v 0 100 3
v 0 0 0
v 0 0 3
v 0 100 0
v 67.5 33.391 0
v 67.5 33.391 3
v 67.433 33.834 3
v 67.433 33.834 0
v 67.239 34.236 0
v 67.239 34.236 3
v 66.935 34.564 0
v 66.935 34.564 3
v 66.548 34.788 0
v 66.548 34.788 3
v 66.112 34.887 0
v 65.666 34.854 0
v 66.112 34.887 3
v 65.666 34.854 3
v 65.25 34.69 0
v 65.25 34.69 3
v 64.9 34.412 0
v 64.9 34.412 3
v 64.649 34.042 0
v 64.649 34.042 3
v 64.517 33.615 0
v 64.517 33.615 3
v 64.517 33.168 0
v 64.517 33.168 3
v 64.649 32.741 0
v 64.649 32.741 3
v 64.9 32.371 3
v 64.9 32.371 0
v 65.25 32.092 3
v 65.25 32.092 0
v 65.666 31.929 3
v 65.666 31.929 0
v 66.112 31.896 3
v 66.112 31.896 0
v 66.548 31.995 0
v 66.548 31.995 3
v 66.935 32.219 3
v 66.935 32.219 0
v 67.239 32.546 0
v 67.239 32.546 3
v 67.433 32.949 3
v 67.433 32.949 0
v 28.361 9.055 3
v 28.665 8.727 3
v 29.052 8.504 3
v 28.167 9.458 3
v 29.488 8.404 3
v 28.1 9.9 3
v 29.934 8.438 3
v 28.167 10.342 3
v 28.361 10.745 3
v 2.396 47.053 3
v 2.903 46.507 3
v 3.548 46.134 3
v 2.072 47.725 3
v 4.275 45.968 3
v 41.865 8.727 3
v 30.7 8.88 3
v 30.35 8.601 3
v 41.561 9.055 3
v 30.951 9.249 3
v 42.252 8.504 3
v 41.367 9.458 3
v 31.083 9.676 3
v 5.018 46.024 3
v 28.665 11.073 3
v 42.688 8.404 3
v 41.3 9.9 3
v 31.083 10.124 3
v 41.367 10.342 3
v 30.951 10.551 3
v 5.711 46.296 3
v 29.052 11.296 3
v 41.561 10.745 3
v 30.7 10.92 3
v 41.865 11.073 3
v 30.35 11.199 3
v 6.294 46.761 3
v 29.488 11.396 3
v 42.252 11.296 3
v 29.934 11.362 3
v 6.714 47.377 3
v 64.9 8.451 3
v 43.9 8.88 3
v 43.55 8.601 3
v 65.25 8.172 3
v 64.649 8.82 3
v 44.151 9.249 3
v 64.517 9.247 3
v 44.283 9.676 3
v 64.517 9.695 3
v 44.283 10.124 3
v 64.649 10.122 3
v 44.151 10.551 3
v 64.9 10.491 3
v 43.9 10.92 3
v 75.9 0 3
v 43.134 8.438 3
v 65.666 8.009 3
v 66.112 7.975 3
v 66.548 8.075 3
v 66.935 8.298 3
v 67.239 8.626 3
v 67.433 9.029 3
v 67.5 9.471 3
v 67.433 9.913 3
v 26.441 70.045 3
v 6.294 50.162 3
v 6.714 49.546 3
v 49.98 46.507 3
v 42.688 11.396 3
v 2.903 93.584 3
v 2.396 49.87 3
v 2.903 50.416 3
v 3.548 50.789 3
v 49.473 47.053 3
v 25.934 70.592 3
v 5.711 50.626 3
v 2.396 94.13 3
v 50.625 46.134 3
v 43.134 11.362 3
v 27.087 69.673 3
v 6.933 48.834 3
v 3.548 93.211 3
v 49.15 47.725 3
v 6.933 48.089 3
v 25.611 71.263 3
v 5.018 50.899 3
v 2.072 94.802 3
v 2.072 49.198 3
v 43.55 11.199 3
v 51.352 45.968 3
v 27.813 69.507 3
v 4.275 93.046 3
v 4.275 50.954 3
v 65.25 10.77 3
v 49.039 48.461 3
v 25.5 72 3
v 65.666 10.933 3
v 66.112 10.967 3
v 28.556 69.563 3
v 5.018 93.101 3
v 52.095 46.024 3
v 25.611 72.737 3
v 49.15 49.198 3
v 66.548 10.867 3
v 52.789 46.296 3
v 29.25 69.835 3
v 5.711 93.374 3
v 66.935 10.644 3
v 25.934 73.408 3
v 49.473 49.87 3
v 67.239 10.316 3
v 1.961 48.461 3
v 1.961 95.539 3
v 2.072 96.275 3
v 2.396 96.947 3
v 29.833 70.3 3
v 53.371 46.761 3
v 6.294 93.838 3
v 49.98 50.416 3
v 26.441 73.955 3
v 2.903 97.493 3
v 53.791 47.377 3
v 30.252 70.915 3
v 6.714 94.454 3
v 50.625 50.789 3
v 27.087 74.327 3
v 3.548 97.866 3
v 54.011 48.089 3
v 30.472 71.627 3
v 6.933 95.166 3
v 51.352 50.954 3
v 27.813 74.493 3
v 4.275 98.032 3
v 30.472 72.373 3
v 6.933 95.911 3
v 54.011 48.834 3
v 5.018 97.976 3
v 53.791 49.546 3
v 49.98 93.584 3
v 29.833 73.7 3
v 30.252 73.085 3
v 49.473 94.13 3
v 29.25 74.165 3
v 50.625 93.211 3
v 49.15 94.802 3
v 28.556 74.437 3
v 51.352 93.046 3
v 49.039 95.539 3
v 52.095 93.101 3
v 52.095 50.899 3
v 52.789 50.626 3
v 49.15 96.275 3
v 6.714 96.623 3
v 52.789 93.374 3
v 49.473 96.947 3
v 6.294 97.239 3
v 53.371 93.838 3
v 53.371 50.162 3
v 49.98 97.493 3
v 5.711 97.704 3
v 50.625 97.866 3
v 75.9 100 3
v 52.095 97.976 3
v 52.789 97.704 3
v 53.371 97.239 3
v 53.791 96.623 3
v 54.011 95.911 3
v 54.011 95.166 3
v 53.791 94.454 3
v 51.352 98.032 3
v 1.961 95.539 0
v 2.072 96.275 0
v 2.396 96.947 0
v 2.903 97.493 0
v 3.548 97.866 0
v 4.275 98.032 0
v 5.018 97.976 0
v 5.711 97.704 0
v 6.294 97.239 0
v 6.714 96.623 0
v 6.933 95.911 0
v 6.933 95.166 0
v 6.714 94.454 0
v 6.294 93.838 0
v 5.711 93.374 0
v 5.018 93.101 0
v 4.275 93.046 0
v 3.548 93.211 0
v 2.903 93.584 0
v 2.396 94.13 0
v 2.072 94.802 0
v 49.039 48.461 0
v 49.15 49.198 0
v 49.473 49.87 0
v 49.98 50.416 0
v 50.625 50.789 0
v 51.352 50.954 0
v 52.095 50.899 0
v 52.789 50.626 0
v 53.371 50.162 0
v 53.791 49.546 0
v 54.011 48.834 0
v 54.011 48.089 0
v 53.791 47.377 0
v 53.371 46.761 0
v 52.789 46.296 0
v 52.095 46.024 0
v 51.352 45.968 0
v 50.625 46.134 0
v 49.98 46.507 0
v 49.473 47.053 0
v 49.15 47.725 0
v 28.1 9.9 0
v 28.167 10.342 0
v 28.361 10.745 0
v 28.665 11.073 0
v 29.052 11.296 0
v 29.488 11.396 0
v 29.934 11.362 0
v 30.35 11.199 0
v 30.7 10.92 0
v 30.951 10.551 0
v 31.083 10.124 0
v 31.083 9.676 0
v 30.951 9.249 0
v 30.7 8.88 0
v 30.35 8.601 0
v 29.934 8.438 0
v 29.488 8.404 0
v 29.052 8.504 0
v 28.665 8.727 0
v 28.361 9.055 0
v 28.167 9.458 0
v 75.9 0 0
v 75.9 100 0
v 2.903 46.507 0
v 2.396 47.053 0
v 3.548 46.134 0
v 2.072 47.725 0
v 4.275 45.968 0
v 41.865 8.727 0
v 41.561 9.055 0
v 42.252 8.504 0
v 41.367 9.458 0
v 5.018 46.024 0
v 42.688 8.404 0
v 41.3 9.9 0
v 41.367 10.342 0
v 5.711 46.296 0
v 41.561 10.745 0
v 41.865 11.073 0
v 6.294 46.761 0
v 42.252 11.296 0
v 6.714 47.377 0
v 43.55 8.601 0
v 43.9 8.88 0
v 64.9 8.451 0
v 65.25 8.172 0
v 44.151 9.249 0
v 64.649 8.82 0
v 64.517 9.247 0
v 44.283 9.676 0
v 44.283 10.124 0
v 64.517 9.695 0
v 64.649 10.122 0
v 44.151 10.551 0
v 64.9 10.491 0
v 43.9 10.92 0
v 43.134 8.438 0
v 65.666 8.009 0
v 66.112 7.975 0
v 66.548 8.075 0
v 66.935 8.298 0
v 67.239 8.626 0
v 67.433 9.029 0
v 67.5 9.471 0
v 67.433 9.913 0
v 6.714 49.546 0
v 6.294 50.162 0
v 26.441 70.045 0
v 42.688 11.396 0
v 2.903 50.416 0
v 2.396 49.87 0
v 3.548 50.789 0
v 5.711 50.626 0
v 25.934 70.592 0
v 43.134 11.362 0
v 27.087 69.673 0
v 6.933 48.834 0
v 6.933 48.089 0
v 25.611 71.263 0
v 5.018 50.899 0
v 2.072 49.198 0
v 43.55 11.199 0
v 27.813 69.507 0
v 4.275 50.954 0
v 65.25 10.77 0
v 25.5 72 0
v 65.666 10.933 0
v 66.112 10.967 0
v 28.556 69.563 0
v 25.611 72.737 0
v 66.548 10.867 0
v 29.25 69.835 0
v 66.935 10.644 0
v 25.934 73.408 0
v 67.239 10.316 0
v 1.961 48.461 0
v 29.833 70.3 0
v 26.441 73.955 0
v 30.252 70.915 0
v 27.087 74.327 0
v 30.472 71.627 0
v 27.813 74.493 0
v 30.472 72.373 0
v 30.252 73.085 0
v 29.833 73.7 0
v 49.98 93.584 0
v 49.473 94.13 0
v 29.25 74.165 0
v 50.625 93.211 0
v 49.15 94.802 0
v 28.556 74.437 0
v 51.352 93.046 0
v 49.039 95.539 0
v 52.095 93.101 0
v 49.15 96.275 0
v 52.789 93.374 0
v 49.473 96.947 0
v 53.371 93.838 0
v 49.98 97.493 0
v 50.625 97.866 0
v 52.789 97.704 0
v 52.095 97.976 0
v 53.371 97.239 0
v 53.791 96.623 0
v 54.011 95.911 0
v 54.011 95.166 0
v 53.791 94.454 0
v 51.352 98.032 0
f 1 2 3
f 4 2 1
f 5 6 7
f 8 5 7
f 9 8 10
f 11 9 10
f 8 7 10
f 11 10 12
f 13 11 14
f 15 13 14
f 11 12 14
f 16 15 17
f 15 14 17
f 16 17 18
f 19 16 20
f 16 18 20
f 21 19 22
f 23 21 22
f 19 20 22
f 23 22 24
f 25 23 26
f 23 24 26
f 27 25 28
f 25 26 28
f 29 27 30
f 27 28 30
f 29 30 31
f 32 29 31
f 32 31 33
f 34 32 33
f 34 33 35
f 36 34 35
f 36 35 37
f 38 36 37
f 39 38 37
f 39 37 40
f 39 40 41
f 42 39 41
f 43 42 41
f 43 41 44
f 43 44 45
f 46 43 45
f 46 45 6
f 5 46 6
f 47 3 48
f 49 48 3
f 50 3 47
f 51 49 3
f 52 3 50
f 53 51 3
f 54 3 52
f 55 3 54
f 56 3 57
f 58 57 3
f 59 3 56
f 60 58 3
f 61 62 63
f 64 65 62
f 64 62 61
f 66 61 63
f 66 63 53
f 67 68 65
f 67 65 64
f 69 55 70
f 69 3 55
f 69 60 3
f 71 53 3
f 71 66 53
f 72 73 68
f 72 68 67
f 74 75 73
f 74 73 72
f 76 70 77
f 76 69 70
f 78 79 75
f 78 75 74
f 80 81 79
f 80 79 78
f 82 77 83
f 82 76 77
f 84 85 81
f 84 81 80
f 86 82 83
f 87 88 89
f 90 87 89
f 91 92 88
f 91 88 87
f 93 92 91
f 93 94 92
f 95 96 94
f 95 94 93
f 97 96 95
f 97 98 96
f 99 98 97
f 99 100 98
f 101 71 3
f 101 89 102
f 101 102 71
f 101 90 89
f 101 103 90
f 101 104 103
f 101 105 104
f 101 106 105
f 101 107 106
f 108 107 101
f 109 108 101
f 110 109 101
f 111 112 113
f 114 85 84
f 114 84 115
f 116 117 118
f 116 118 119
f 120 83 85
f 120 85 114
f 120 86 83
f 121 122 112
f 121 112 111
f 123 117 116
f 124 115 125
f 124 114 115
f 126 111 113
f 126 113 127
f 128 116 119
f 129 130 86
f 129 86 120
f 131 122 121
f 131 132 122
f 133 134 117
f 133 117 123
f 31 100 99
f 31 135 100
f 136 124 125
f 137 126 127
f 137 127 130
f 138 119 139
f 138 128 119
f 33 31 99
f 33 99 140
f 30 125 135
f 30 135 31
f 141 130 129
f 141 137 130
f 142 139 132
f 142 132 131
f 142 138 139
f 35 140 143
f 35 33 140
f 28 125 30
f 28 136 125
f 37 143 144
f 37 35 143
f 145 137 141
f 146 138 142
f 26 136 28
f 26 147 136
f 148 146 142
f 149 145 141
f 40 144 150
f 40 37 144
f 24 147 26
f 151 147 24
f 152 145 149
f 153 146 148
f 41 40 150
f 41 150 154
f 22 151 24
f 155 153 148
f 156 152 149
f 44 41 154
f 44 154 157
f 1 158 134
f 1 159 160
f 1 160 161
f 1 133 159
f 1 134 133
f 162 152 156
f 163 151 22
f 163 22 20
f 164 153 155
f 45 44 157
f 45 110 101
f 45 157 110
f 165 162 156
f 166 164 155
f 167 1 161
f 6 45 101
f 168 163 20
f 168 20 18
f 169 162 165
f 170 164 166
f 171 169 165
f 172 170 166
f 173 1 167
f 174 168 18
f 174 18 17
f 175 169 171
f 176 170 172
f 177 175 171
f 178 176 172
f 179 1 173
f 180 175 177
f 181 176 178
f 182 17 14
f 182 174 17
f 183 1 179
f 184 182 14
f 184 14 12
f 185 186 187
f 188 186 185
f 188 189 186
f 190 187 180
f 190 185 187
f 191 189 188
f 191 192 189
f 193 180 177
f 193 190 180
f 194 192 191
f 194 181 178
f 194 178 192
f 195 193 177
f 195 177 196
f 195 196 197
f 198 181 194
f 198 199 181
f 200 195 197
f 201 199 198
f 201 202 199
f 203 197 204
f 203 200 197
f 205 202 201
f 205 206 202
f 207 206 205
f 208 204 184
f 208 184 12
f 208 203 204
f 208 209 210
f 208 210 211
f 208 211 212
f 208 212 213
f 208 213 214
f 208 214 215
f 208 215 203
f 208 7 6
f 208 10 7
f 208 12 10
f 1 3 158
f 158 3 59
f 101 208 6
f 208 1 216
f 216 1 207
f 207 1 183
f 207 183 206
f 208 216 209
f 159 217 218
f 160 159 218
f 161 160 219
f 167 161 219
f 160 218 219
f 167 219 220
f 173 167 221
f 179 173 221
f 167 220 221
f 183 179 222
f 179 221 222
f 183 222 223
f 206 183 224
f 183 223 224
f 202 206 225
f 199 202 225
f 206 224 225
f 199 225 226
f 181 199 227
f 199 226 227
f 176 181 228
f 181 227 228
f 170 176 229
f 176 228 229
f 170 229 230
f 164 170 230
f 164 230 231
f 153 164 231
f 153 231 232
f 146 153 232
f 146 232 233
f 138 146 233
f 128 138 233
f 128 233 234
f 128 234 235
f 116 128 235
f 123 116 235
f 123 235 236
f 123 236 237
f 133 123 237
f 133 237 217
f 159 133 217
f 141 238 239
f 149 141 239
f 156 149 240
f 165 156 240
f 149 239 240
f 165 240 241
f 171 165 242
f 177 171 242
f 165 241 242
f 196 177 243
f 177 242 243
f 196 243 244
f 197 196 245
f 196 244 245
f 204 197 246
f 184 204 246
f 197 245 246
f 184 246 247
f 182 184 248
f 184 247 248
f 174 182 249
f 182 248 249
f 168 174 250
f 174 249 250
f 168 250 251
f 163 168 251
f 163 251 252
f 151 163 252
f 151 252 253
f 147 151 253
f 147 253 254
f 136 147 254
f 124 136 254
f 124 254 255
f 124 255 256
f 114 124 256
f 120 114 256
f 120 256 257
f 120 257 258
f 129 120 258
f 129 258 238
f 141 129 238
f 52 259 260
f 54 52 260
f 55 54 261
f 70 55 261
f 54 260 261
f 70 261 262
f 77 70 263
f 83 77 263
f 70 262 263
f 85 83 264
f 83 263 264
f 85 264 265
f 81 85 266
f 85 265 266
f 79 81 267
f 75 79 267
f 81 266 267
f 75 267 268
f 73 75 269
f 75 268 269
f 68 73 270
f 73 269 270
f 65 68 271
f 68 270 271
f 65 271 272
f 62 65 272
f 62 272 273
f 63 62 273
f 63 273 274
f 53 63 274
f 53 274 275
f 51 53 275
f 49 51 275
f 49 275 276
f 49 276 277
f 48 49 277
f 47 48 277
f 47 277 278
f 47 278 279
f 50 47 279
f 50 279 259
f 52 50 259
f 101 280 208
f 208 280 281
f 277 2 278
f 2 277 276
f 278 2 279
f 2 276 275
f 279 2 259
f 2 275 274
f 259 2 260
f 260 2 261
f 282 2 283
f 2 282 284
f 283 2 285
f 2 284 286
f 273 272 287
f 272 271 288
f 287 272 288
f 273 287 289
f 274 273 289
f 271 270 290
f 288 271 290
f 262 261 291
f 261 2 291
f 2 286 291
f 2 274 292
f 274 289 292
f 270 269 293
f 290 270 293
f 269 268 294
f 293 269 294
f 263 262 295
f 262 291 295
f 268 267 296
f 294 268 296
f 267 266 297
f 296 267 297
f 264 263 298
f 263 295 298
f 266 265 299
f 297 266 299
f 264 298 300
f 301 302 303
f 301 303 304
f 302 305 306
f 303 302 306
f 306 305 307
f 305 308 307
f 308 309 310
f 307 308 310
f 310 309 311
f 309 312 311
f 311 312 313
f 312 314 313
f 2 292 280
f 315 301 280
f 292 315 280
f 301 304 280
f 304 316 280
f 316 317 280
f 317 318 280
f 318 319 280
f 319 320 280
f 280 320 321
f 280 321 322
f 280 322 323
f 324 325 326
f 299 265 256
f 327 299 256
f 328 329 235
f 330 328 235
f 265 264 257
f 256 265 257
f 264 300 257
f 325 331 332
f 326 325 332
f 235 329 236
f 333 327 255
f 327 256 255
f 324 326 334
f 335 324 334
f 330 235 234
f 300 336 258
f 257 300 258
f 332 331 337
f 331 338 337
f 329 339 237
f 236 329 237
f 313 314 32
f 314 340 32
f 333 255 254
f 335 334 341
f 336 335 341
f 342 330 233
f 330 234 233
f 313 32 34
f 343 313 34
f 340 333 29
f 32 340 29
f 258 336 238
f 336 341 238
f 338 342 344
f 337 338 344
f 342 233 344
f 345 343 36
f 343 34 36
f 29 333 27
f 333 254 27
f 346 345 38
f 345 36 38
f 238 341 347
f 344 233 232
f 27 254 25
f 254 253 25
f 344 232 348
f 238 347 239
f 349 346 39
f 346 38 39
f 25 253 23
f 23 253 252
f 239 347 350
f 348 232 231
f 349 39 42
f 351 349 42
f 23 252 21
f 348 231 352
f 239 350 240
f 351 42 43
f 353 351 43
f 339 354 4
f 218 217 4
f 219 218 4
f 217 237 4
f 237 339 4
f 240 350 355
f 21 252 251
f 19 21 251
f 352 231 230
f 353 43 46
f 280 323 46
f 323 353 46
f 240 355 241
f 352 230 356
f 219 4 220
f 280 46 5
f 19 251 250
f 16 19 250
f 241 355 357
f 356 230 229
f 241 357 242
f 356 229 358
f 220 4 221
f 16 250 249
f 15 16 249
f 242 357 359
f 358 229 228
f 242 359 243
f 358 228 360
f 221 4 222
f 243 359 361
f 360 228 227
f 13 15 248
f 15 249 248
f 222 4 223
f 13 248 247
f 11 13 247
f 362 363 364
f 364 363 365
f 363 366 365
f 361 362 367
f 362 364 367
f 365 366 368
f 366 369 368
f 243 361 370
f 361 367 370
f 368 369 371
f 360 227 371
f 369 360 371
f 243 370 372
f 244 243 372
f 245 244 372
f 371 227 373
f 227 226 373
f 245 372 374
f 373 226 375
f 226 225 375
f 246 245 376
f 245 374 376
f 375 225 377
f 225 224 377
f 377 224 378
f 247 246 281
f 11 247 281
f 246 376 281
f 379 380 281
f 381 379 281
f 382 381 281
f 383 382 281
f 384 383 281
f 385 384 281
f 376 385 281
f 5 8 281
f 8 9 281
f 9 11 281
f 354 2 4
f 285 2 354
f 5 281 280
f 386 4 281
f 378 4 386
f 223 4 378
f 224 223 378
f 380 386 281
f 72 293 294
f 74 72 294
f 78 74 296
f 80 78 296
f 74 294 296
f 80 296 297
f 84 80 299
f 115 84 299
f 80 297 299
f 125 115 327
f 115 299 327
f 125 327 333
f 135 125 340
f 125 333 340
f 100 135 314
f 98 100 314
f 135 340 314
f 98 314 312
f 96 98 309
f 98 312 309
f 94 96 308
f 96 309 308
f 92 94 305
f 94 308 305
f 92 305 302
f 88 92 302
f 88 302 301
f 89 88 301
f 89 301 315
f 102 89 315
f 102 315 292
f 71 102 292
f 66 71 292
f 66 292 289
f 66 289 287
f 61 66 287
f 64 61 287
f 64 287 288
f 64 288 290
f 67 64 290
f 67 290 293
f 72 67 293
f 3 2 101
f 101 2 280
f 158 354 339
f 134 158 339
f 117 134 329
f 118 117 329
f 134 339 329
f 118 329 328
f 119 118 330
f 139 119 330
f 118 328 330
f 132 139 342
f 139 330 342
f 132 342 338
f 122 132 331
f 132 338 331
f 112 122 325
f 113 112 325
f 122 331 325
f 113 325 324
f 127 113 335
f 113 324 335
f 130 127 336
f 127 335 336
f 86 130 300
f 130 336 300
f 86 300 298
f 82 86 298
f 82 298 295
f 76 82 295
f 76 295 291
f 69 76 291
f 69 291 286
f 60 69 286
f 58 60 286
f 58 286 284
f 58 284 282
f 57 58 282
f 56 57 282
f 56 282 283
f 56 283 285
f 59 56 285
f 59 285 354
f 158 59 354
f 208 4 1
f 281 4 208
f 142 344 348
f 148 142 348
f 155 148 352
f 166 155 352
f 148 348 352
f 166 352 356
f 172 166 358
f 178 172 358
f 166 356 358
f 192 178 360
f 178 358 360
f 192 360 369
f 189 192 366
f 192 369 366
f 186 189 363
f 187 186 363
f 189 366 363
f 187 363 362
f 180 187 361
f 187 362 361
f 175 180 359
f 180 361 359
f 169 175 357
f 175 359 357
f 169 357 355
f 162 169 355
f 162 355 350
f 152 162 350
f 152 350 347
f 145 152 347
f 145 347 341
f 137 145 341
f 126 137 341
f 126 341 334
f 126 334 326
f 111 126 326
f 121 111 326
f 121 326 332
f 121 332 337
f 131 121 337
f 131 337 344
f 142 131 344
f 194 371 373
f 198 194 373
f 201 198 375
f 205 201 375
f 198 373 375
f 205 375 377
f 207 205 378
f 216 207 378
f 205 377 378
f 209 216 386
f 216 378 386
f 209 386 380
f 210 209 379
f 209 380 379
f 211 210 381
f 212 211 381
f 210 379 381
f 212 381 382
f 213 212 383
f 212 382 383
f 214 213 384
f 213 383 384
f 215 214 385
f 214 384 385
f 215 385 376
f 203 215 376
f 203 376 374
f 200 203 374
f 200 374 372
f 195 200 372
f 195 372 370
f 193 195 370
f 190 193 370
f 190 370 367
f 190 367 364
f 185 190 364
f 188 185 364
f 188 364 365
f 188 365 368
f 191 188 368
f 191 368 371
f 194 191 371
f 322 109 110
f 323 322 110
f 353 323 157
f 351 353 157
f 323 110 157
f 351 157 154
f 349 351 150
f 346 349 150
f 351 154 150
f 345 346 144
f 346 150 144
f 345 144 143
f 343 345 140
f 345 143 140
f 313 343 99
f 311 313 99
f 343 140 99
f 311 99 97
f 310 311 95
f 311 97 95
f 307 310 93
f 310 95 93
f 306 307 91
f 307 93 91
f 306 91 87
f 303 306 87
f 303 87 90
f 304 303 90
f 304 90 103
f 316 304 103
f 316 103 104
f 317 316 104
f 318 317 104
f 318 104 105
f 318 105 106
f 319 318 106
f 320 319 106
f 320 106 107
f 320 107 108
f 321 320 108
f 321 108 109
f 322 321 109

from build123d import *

# Parameters (mm, degrees)
SKETCH1_W           = 75.9
SKETCH1_H           = 100
BOSS_EXTRUDE1_DEPTH = 3
SKETCH2_R           = 2.5
CUT_EXTRUDE1_DEPTH  = 10
SKETCH5_R           = 1.5
CUT_EXTRUDE2_DEPTH  = 10
SKETCH7_R           = 1.5
CUT_EXTRUDE3_DEPTH  = 19.8
SKETCH8_R           = 2.5
CUT_EXTRUDE4_DEPTH  = 10


with BuildPart() as part:
    # Sketch1 → Boss-Extrude1 (new body)
    with BuildSketch(Plane.XY):
        with Locations((37.95, 50)):
            Rectangle(SKETCH1_W, SKETCH1_H)
    extrude(amount=BOSS_EXTRUDE1_DEPTH)

    # Sketch2 → Cut-Extrude1 (cut)
    with BuildSketch(Plane(origin=(0, 0, 0), x_dir=(-1, 0, 0), z_dir=(0, 0, -1))):
        with Locations((-51.538582233, 95.538582233)):
            Circle(SKETCH2_R)
        with Locations((-4.461417767, 95.538582233)):
            Circle(SKETCH2_R)
        with Locations((-4.461417767, 48.461417767)):
            Circle(SKETCH2_R)
        with Locations((-51.538582233, 48.461417767)):
            Circle(SKETCH2_R)
    extrude(amount=-CUT_EXTRUDE1_DEPTH, mode=Mode.SUBTRACT)

    # Sketch5 → Cut-Extrude2 (cut)
    with BuildSketch(Plane.XY.offset(3)):
        with Locations((66, 33.391370051)):
            Circle(SKETCH5_R)
        with Locations((66, 9.470993714)):
            Circle(SKETCH5_R)
    extrude(amount=-CUT_EXTRUDE2_DEPTH, mode=Mode.SUBTRACT)

    # Sketch7 → Cut-Extrude3 (cut)
    with BuildSketch(Plane(origin=(0, 0, 0), x_dir=(-1, 0, 0), z_dir=(0, 0, -1))):
        with Locations((-29.6, 9.9)):
            Circle(SKETCH7_R)
        with Locations((-42.8, 9.9)):
            Circle(SKETCH7_R)
    extrude(amount=-CUT_EXTRUDE3_DEPTH, mode=Mode.SUBTRACT)

    # Sketch8 → Cut-Extrude4 (cut)
    with BuildSketch(Plane(origin=(0, 0, 0), x_dir=(-1, 0, 0), z_dir=(0, 0, -1))):
        with Locations((-28, 72)):
            Circle(SKETCH8_R)
    extrude(amount=-CUT_EXTRUDE4_DEPTH, mode=Mode.SUBTRACT)


solid = part.part
